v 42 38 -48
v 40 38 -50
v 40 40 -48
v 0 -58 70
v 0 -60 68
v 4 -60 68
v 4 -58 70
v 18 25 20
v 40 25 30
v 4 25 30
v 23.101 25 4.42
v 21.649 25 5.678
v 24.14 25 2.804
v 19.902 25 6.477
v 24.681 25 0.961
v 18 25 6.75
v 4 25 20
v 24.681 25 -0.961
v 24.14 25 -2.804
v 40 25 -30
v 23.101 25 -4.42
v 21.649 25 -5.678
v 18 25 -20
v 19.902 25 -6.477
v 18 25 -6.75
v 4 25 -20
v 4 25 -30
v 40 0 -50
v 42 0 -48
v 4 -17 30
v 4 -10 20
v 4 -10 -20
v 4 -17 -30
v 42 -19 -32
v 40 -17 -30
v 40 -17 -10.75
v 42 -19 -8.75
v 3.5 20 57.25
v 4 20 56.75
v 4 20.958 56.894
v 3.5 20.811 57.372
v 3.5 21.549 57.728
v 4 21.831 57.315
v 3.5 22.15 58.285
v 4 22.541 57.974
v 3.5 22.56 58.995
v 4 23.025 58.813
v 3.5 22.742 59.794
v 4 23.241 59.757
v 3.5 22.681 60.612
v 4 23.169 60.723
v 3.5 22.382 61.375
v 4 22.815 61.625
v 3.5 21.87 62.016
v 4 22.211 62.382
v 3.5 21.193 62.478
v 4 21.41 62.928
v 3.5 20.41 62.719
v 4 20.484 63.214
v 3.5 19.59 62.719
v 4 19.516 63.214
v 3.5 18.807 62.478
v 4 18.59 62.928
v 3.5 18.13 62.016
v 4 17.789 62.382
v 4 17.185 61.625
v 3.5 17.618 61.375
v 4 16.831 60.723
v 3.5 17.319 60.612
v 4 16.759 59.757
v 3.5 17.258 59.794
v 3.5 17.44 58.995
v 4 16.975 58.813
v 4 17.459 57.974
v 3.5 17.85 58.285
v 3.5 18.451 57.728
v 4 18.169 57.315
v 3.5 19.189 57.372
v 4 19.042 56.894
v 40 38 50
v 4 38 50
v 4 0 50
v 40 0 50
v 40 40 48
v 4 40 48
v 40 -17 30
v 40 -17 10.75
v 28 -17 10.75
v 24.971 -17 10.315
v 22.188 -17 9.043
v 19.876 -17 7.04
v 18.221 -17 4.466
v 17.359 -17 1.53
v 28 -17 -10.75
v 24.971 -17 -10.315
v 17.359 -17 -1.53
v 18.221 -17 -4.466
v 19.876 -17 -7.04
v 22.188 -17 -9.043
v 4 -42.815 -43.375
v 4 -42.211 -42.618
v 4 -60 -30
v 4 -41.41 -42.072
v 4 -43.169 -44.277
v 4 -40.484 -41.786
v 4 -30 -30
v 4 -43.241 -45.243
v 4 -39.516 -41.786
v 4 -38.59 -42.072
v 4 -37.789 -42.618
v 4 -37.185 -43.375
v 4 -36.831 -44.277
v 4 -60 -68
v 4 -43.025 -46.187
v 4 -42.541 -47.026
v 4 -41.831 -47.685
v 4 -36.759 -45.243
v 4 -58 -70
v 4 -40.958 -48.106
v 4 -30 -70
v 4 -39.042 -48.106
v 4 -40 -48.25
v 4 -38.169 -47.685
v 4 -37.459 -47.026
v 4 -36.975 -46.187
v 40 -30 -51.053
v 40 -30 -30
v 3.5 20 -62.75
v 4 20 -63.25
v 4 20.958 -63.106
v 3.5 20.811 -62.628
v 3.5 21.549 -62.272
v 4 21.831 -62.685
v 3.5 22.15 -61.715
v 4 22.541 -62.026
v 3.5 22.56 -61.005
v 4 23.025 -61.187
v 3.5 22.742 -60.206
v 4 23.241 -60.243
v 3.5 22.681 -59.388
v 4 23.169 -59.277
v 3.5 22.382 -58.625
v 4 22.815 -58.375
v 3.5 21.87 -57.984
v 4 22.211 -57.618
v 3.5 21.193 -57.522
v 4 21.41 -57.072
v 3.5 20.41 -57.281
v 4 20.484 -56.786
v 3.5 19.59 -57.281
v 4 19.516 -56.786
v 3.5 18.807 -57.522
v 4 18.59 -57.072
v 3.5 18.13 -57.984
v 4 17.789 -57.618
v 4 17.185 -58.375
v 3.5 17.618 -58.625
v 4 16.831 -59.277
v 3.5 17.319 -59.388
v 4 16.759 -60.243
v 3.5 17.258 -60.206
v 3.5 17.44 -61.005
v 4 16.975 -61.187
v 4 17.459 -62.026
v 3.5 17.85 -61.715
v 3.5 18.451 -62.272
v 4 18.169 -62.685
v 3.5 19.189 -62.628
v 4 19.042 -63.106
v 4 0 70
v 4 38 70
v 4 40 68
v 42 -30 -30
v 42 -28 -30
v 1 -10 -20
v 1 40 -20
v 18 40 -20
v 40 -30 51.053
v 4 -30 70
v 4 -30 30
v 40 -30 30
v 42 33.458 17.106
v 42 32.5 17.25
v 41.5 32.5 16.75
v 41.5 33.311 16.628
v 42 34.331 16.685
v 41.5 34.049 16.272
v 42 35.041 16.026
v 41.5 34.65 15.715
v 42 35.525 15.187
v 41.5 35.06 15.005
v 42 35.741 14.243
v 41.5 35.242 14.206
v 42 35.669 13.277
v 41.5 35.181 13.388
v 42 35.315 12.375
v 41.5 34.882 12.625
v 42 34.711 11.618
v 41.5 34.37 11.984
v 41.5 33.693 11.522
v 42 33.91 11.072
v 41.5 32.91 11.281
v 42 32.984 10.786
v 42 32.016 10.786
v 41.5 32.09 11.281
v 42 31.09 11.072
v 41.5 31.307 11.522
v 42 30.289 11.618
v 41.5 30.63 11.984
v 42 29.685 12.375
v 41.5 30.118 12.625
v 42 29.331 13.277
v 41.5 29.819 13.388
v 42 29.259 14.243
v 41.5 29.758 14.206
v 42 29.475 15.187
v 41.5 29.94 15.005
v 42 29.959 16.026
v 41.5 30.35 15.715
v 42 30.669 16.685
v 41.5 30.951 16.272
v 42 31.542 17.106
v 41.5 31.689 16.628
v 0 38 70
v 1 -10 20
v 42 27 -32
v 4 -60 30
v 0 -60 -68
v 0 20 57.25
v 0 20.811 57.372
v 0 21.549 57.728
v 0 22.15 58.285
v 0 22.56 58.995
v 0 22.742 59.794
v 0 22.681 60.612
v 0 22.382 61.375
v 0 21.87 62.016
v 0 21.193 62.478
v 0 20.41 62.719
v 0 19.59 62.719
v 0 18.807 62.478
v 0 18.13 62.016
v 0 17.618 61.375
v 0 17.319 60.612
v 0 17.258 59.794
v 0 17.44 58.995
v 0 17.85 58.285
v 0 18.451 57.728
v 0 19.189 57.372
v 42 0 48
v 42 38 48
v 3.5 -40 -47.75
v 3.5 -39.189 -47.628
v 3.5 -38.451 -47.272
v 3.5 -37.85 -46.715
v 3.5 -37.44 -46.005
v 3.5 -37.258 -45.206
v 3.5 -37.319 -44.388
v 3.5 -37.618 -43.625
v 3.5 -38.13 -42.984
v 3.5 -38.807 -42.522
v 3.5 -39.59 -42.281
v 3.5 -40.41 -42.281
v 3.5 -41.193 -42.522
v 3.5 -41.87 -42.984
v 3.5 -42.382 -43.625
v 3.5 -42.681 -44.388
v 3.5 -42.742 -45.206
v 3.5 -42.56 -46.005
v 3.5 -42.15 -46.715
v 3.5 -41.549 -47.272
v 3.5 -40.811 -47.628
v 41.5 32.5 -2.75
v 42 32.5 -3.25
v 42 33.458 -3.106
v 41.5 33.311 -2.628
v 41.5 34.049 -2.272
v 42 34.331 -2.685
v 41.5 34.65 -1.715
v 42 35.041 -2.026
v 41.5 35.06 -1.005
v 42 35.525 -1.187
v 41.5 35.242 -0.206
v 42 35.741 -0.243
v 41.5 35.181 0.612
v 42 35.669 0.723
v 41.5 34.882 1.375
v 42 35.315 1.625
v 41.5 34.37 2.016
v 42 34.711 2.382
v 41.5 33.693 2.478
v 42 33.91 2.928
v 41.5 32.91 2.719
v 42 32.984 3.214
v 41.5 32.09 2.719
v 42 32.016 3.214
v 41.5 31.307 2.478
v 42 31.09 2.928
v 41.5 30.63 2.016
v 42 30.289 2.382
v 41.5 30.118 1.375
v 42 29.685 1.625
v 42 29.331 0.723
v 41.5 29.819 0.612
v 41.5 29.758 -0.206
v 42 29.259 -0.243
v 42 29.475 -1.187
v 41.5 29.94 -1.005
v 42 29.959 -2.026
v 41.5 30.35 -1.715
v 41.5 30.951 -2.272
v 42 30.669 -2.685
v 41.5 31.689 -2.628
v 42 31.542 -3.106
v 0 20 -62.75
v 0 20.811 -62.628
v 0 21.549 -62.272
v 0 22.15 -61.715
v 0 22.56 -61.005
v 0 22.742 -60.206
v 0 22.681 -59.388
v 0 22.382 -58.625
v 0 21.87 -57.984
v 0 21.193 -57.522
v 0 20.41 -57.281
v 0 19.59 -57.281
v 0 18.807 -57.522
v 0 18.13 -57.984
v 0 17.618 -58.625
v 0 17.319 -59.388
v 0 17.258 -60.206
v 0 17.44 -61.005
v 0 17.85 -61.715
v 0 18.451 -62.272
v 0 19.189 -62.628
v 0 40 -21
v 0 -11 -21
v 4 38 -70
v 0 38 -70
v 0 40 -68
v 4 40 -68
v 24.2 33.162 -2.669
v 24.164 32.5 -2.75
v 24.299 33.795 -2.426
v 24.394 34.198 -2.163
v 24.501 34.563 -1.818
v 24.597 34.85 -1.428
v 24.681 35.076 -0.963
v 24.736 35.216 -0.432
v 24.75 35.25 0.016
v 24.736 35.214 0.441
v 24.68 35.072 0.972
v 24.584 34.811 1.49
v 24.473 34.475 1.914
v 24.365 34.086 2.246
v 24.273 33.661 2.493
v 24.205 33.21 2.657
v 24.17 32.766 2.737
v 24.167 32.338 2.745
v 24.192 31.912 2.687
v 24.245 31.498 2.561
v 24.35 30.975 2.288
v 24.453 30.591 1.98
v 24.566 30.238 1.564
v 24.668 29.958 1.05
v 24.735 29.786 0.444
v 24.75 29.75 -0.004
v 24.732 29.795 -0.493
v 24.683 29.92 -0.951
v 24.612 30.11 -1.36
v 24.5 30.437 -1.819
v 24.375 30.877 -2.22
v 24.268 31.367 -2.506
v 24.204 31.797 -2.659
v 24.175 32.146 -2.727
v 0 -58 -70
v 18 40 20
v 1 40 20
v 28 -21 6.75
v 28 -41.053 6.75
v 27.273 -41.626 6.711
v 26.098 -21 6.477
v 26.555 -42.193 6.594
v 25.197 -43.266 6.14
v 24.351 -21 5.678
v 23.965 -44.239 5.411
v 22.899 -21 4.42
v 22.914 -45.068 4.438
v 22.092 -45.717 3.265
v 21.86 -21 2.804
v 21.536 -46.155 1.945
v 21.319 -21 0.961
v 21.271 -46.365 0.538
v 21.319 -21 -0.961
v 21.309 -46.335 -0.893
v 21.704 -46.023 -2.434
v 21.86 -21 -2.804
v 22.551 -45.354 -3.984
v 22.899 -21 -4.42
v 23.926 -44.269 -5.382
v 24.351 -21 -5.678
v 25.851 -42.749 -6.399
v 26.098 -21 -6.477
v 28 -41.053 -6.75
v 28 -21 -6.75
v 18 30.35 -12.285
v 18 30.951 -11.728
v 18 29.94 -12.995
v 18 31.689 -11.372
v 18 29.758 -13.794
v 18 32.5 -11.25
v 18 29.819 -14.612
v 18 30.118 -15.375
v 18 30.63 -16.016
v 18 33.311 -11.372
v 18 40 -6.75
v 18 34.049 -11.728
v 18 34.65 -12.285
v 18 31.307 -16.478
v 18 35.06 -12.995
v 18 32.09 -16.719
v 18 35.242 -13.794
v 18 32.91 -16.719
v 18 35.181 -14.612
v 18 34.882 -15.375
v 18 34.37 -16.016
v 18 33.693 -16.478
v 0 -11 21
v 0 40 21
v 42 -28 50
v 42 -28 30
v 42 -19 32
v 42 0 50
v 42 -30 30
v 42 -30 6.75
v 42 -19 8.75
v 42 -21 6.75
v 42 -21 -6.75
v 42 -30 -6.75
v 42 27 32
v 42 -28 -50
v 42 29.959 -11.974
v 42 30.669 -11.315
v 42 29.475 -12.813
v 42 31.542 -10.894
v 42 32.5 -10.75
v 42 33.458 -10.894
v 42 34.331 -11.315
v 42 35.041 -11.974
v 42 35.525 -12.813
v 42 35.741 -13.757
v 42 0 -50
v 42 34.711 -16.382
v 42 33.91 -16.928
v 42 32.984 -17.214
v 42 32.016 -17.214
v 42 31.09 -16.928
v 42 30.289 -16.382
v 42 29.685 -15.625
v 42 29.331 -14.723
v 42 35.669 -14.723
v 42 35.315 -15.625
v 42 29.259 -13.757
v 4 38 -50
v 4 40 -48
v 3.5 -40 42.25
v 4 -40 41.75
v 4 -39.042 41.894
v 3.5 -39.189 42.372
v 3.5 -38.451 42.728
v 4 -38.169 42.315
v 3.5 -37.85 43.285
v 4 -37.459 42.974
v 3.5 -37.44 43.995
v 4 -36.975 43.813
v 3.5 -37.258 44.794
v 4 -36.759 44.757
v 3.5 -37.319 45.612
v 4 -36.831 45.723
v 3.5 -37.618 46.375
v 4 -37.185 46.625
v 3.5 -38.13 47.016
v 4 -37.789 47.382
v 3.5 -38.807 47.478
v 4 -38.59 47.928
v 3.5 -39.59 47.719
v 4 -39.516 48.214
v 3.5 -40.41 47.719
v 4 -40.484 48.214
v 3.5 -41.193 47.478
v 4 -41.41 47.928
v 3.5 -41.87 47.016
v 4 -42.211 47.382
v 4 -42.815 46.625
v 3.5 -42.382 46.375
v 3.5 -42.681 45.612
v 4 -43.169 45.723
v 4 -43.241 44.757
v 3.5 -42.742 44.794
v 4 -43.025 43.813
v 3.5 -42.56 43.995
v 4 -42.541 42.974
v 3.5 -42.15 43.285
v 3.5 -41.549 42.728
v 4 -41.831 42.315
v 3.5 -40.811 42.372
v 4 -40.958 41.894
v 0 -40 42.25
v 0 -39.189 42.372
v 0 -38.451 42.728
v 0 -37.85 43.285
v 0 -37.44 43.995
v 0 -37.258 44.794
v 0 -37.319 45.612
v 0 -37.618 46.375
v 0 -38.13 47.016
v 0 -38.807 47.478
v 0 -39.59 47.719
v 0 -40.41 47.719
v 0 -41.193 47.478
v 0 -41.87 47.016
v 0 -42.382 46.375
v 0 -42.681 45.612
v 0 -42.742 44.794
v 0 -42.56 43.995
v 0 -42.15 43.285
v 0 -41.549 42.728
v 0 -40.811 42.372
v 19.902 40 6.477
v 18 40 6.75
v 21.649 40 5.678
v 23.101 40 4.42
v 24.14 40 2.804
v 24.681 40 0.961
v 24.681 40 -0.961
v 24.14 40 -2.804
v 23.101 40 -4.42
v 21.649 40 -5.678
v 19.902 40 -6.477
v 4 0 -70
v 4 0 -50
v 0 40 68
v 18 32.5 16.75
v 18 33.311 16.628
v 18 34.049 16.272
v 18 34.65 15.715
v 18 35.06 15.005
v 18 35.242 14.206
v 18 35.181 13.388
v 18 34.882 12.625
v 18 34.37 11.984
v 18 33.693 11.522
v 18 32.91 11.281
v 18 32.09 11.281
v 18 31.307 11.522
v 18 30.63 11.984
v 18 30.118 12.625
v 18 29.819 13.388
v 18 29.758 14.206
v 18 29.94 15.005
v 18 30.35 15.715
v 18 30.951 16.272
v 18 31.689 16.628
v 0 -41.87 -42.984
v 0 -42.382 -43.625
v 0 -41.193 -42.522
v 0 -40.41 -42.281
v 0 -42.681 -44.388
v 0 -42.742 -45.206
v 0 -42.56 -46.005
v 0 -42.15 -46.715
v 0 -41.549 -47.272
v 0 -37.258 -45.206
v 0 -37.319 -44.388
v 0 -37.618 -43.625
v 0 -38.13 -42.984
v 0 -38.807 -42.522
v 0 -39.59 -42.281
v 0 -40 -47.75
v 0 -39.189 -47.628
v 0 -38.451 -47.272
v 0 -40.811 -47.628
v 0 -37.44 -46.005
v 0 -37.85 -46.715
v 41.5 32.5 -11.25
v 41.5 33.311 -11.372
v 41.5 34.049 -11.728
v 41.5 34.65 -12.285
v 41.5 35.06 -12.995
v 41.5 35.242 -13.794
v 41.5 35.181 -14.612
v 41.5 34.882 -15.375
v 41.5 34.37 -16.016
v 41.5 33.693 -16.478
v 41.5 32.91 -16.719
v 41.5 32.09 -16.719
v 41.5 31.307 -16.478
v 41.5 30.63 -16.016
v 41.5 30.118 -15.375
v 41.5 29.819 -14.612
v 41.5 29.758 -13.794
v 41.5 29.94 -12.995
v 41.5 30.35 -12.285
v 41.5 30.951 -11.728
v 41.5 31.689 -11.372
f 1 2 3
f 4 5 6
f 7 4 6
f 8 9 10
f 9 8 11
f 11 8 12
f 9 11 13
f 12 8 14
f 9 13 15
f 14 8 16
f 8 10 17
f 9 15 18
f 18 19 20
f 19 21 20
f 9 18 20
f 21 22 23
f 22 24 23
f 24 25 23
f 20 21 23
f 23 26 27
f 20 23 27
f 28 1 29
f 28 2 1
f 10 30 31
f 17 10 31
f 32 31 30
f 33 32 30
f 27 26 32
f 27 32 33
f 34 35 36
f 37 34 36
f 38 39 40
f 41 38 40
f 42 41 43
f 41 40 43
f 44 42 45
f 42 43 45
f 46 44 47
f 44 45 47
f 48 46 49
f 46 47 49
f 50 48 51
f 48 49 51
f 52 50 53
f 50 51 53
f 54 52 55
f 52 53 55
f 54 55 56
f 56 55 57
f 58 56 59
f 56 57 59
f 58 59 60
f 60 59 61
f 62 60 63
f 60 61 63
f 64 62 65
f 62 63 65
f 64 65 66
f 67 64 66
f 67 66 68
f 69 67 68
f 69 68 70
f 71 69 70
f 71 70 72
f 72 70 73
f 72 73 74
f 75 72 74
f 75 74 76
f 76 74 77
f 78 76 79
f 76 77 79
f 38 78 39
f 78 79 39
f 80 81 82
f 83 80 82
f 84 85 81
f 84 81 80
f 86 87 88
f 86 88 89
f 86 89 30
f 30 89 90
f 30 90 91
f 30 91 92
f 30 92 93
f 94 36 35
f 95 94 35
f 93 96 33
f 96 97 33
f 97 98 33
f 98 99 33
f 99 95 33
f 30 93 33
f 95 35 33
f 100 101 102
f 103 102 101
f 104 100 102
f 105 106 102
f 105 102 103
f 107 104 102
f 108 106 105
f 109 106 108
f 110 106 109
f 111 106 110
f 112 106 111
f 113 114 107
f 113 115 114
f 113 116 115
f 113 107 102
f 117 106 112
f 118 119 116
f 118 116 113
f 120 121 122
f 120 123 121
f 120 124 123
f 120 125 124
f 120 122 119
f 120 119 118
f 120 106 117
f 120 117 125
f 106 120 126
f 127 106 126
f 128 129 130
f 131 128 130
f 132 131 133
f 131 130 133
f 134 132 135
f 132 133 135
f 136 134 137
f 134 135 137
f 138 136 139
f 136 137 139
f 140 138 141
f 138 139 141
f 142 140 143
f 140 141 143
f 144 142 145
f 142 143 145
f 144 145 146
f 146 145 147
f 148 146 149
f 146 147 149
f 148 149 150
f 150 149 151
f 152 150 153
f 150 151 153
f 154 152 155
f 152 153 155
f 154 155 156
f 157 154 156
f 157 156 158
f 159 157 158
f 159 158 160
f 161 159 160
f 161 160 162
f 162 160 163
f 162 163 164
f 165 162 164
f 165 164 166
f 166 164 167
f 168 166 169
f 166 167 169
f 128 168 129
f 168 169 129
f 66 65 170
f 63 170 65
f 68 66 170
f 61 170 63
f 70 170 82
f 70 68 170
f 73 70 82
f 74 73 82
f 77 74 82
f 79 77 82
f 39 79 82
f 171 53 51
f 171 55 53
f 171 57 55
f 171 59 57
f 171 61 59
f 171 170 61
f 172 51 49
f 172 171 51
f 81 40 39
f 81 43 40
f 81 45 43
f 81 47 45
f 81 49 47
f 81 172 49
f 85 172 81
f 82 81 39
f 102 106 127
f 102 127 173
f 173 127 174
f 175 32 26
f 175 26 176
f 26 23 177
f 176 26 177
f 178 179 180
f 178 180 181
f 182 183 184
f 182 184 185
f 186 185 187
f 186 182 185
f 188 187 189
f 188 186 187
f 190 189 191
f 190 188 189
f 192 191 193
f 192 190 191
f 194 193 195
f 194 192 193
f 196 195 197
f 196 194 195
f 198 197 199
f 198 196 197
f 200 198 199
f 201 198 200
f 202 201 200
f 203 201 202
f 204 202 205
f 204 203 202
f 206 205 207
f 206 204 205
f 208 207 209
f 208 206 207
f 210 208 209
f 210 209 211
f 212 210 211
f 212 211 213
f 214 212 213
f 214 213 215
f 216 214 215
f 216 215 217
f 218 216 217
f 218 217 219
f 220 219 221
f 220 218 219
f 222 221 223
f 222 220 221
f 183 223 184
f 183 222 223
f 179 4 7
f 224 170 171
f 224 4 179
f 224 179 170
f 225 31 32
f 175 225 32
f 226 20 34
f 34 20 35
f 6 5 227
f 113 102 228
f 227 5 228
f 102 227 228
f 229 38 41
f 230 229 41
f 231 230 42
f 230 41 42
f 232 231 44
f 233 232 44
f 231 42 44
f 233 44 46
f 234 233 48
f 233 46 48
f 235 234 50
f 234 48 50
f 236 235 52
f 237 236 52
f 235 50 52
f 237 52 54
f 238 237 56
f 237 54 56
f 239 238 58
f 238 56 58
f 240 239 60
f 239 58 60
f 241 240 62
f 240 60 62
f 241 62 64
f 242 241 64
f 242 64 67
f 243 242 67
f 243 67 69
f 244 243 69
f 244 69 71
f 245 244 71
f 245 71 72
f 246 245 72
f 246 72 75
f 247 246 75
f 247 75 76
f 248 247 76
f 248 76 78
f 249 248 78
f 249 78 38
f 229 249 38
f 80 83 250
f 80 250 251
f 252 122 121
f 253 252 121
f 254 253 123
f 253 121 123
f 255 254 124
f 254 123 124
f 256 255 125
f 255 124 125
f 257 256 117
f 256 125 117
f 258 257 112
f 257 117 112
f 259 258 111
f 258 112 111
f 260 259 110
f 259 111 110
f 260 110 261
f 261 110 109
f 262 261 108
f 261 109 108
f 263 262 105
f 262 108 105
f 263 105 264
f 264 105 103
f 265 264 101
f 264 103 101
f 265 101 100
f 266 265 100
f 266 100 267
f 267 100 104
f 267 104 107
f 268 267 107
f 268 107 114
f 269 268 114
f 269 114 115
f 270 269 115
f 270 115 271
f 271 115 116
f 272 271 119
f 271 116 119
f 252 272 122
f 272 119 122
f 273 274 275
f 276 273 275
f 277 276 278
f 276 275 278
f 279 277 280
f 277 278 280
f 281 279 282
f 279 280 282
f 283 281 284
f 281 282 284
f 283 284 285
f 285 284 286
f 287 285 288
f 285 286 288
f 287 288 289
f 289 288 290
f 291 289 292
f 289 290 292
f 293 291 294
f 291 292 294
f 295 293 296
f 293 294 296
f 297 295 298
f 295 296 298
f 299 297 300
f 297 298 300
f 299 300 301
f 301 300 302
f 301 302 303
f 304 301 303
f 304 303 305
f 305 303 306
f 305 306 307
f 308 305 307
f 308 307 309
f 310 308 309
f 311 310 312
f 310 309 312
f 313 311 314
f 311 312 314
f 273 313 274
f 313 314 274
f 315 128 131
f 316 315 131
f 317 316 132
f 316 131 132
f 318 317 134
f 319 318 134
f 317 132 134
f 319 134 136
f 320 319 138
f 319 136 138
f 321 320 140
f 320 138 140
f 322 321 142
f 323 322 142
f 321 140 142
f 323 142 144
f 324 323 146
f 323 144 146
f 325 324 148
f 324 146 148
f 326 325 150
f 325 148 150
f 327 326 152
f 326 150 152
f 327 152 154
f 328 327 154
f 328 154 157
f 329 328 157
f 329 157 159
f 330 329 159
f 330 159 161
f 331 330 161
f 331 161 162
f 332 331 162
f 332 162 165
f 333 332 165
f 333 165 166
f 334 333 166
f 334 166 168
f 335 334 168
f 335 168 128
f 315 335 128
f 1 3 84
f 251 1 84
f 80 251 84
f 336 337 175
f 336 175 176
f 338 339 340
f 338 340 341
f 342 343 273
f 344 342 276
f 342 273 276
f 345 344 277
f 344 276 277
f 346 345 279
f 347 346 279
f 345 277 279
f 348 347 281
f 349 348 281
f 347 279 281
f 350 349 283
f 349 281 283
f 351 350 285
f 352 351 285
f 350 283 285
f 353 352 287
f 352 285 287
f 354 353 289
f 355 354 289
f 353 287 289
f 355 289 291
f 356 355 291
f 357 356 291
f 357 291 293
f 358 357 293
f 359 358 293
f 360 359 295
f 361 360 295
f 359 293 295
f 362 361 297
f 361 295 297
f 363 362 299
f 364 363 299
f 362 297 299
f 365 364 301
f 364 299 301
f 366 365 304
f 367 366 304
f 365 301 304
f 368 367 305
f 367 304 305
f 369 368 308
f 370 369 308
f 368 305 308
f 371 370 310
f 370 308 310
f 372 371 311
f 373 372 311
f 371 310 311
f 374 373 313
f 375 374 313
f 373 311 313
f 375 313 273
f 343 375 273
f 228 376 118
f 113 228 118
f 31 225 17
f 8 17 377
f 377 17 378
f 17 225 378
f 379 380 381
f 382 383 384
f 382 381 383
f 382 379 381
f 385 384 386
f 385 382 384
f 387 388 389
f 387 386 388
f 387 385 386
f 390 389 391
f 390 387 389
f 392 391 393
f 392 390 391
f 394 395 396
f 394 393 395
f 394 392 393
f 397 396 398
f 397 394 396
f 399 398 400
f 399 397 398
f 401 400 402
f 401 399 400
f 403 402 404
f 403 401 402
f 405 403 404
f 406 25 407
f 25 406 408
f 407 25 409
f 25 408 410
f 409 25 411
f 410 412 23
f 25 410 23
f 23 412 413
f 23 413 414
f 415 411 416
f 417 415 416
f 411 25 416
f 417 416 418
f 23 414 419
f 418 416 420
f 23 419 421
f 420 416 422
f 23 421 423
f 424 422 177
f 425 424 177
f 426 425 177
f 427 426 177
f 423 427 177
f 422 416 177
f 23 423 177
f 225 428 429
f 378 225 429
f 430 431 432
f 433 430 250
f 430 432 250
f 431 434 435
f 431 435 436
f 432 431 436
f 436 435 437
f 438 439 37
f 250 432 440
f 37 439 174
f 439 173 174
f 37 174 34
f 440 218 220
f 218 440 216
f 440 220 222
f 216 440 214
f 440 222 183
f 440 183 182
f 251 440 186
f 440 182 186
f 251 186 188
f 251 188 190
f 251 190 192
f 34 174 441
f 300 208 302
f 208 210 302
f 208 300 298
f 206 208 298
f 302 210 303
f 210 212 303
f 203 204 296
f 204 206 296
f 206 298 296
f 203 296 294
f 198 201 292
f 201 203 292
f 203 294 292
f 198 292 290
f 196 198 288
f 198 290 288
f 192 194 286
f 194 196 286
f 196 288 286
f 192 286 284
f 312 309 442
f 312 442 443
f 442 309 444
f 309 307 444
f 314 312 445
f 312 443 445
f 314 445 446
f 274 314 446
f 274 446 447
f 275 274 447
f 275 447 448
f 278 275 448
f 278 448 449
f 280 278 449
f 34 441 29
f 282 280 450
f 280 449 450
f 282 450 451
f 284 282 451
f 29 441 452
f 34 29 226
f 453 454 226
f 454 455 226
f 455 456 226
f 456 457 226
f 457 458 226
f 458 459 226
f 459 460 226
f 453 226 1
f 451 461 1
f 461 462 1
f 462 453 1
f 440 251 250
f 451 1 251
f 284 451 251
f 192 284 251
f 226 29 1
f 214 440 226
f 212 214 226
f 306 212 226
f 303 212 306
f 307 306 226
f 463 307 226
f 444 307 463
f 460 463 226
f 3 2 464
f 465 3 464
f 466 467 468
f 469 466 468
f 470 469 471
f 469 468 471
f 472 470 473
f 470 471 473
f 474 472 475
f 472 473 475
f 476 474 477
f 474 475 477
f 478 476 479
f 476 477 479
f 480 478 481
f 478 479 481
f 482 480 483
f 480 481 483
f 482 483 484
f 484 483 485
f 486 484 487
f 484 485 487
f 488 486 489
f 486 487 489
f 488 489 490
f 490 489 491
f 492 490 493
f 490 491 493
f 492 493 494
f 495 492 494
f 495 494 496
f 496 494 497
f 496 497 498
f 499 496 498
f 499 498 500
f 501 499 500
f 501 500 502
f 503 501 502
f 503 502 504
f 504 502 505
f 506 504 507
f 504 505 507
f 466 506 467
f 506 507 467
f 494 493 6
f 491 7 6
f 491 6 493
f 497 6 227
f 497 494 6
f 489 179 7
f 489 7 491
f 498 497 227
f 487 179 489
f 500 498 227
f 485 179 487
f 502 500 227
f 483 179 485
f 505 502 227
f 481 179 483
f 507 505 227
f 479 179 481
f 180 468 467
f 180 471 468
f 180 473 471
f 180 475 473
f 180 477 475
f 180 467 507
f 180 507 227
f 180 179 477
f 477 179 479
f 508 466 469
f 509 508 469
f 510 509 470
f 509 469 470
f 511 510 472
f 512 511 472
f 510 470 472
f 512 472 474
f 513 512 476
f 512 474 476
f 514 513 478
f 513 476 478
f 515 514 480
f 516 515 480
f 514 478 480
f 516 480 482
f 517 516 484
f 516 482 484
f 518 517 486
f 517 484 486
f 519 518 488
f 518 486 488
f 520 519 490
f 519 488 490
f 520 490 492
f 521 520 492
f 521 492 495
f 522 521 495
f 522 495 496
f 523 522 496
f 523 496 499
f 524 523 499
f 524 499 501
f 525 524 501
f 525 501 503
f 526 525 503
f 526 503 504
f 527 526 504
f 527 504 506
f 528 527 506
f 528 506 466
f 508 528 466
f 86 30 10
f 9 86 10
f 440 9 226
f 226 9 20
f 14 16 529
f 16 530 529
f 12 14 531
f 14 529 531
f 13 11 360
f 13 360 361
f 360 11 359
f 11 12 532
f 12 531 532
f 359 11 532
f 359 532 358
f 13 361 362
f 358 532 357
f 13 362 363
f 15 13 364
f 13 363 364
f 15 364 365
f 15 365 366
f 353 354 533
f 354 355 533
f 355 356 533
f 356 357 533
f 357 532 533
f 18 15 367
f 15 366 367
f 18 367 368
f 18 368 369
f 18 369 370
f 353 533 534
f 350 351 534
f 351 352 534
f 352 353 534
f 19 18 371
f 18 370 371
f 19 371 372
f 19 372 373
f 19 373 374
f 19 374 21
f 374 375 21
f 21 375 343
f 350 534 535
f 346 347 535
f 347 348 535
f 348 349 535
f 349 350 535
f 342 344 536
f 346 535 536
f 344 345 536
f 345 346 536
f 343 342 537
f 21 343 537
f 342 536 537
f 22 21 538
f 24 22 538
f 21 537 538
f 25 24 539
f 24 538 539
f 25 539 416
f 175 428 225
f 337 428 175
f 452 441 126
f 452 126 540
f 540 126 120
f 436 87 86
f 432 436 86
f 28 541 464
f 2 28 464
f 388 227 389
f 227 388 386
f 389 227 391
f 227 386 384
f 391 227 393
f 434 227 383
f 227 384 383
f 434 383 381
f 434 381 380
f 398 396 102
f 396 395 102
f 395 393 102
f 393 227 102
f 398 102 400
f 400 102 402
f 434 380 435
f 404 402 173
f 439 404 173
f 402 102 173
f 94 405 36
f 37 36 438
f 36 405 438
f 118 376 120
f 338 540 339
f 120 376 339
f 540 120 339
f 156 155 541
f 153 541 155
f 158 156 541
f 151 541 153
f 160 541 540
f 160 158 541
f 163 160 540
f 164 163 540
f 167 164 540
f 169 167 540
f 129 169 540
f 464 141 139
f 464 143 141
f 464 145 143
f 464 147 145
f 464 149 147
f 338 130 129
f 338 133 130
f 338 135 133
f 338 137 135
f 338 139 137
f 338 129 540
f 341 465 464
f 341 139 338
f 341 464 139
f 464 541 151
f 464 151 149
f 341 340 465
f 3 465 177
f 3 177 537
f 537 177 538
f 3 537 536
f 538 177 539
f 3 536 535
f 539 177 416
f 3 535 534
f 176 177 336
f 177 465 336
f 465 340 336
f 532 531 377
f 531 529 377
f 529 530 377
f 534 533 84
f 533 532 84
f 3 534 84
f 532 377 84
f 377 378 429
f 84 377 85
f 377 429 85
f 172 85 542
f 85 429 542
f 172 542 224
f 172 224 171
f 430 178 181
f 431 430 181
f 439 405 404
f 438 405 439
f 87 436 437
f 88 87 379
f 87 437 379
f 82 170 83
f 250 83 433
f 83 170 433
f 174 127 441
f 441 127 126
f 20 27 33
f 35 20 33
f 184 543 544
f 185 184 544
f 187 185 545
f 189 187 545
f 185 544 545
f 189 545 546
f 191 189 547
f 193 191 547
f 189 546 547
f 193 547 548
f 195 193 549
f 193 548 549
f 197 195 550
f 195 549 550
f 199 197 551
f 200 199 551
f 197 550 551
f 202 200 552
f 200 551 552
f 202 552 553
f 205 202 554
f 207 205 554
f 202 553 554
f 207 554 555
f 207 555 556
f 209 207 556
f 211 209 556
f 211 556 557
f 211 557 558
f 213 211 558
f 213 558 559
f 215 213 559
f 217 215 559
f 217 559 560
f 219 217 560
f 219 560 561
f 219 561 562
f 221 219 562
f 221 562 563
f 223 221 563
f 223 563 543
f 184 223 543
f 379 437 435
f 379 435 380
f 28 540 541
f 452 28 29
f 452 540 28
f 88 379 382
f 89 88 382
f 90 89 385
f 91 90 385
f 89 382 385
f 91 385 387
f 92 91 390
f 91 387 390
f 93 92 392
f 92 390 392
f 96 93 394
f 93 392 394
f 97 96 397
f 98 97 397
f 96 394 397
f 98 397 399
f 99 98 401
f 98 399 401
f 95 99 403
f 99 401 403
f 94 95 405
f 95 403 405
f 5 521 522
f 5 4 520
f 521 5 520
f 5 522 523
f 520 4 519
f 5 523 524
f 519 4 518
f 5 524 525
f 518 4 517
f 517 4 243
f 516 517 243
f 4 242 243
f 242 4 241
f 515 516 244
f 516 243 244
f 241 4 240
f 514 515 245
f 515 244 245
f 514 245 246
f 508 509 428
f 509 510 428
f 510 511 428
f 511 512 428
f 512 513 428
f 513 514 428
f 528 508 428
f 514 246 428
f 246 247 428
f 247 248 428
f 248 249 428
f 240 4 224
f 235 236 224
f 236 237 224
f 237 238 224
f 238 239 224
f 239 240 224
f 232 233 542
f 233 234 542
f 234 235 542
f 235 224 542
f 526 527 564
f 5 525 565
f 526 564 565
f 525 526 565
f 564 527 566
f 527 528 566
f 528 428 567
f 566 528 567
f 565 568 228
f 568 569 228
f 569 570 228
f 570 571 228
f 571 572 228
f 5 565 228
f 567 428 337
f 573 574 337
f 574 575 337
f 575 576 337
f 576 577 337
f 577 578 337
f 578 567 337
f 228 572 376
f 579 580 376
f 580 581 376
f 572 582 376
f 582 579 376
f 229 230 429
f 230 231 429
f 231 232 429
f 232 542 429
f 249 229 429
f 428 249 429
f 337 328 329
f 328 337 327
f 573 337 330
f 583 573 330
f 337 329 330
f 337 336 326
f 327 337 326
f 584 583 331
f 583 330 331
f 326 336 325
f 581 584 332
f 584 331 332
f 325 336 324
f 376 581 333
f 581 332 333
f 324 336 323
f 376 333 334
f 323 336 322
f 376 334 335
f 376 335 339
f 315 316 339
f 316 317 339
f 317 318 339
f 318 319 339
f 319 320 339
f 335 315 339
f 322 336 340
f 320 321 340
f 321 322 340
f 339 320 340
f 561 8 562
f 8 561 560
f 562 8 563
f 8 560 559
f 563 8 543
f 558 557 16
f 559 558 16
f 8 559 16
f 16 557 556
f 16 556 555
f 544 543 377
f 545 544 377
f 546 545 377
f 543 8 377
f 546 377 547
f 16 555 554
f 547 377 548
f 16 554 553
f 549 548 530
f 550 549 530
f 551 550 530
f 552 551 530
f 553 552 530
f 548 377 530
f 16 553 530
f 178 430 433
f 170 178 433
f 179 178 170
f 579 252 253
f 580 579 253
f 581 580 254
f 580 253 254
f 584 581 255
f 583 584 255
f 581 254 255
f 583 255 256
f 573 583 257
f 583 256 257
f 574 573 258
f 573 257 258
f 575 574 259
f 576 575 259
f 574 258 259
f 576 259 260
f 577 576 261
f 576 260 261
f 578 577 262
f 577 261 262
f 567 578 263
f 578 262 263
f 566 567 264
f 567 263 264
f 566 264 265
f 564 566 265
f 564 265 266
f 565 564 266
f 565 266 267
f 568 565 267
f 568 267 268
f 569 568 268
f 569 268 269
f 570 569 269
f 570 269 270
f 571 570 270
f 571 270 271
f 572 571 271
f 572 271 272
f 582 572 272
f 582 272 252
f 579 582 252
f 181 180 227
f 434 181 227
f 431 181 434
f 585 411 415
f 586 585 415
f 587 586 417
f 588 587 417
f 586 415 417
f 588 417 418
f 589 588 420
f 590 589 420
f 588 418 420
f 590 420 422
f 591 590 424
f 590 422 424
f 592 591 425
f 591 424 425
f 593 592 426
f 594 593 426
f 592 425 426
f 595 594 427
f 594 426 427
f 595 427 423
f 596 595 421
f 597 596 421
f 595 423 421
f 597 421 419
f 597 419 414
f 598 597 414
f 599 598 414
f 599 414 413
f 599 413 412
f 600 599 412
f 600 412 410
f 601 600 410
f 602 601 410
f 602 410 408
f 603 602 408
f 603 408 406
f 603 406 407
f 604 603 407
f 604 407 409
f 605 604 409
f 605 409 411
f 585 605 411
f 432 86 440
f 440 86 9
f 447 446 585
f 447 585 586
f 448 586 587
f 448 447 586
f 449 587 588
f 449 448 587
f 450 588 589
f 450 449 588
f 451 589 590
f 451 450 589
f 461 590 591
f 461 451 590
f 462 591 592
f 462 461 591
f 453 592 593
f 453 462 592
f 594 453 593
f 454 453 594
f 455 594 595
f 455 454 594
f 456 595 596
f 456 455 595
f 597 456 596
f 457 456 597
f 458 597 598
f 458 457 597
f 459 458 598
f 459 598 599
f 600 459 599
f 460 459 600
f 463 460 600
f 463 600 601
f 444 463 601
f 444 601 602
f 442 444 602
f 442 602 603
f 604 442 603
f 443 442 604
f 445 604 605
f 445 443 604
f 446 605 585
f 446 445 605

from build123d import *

# Parameters (mm, degrees)
SKETCH_1_W          = 140
SKETCH_1_H          = 100
EXTRUDE_1_DEPTH     = 4
SKETCH_9_R          = 2.75
CUT_EXTRUDE_3_DEPTH = 8
CHAMFER_2_SIZE      = 2
SKETCH_11_W         = 40
SKETCH_11_H         = 50
CUT_EXTRUDE_5_DEPTH = 5
SKETCH_12_W         = 10
SKETCH_12_H         = 15
EXTRUDE_2_DEPTH     = 14
SKETCH_13_W         = 60
SKETCH_13_H         = 15
EXTRUDE_3_DEPTH     = 14
SKETCH_14_W         = 28
SKETCH_14_H         = 70
EXTRUDE_4_DEPTH     = 20
SKETCH_15_W         = 28
SKETCH_15_H         = 70
EXTRUDE_5_DEPTH     = 20
SKETCH_16_R         = 6.75
CUT_EXTRUDE_6_DEPTH = 20
EXTRUDE_6_DEPTH     = 10
SKETCH_18_R         = 2.75
CUT_EXTRUDE_7_DEPTH = 96.268042911
SKETCH_19_R         = 2.75
CUT_EXTRUDE_8_DEPTH = 100
CHAMFER_3_SIZE      = 0.5
EXTRUDE_7_DEPTH     = 20
EXTRUDE_8_DEPTH     = 20
EXTRUDE_9_DEPTH     = 60
EXTRUDE_10_DEPTH    = 30
CHAMFER_4_SIZE      = 0.5
CHAMFER_5_SIZE      = 2
CHAMFER_6_SIZE      = 2
CHAMFER_7_SIZE      = 1
CUT_EXTRUDE_9_DEPTH = 100.564049794
CHAMFER_8_SIZE      = 4


with BuildPart() as part:
    # 草图1 → 凸台-拉伸1 (new body)
    with BuildSketch(Plane(origin=(0, 0, 0), x_dir=(0, 0, -1), z_dir=(1, 0, 0))):
        with Locations((0, -10)):
            Rectangle(SKETCH_1_W, SKETCH_1_H)
    extrude(amount=EXTRUDE_1_DEPTH)

    # 草图9 → 切除-拉伸3 (cut)
    with BuildSketch(Plane(origin=(4, 0, 0), x_dir=(0, 0, -1), z_dir=(1, 0, 0))):
        with Locations((-60, 20)):
            Circle(SKETCH_9_R)
        with Locations((60, 20)):
            Circle(SKETCH_9_R)
        with Locations((-45, -40)):
            Circle(SKETCH_9_R)
        with Locations((45, -40)):
            Circle(SKETCH_9_R)
    extrude(amount=-CUT_EXTRUDE_3_DEPTH, mode=Mode.SUBTRACT)

    # 倒角2
    chamfer_2_edges = [part.edges().sort_by_distance(p)[0] for p in [
        (2, 40, 70),
        (2, 40, -70),
        (2, -60, -70),
        (2, -60, 70),
    ]]
    chamfer(chamfer_2_edges, length=CHAMFER_2_SIZE)

    # 草图11 → 切除-拉伸5 (cut)
    with BuildSketch(Plane(origin=(4, 0, 0), x_dir=(0, 0, -1), z_dir=(1, 0, 0))):
        with Locations((0, 15)):
            Rectangle(SKETCH_11_W, SKETCH_11_H)
    extrude(amount=-CUT_EXTRUDE_5_DEPTH, mode=Mode.SUBTRACT)

    # 草图12 → 凸台-拉伸2 (add)
    with BuildSketch(Plane(origin=(4, 0, 0), x_dir=(0, 0, -1), z_dir=(1, 0, 0))):
        with Locations((-25, 32.5)):
            Rectangle(SKETCH_12_W, SKETCH_12_H)
        with Locations((25, 32.5)):
            Rectangle(SKETCH_12_W, SKETCH_12_H)
    extrude(amount=EXTRUDE_2_DEPTH)

    # 草图13 → 凸台-拉伸3 (add)
    with BuildSketch(Plane(origin=(18, 0, 0), x_dir=(0, 0, -1), z_dir=(1, 0, 0))):
        with Locations((0, 32.5)):
            Rectangle(SKETCH_13_W, SKETCH_13_H)
    extrude(amount=EXTRUDE_3_DEPTH)

    # 草图14 → 凸台-拉伸4 (add)
    with BuildSketch(Plane.XY.offset(30)):
        with Locations((18, 5)):
            Rectangle(SKETCH_14_W, SKETCH_14_H)
    extrude(amount=EXTRUDE_4_DEPTH)

    # 草图15 → 凸台-拉伸5 (add)
    with BuildSketch(Plane(origin=(0, 0, -30), x_dir=(-1, 0, 0), z_dir=(0, 0, -1))):
        with Locations((-18, 5)):
            Rectangle(SKETCH_15_W, SKETCH_15_H)
    extrude(amount=EXTRUDE_5_DEPTH)

    # 草图16 → 切除-拉伸6 (cut)
    with BuildSketch(Plane(origin=(0, 40, 0), x_dir=(1, 0, 0), z_dir=(0, 1, 0))):
        with Locations((18, 0)):
            Circle(SKETCH_16_R)
    extrude(amount=-CUT_EXTRUDE_6_DEPTH, mode=Mode.SUBTRACT)

    # 草图17 → 凸台-拉伸6 (add)
    with BuildSketch(Plane(origin=(32, 0, 0), x_dir=(0, 0, -1), z_dir=(1, 0, 0))):
        Polygon((50, 40), (-50, 40), (-50, -30), (-30, -30), (-30, 25), (30, 25), (30, -30), (50, -30), align=None)
    extrude(amount=EXTRUDE_6_DEPTH)

    # 草图18 → 切除-拉伸7 (cut, through all)
    with BuildSketch(Plane.ZY.offset(-18)):
        with Locations((14, 32.5)):
            Circle(SKETCH_18_R)
        with Locations((-14, 32.5)):
            Circle(SKETCH_18_R)
    extrude(amount=-CUT_EXTRUDE_7_DEPTH, mode=Mode.SUBTRACT)

    # 草图19 → 切除-拉伸8 (cut)
    with BuildSketch(Plane(origin=(42, 0, 0), x_dir=(0, 0, -1), z_dir=(1, 0, 0))):
        with Locations((0, 32.5)):
            Circle(SKETCH_19_R)
    extrude(amount=-CUT_EXTRUDE_8_DEPTH, mode=Mode.SUBTRACT)

    # 倒角3
    chamfer_3_edges = [part.edges().sort_by_distance(p)[0] for p in [
        (4, 20, 62.75),
        (4, -40, -42.25),
        (4, -40, 47.75),
        (4, 20, -57.25),
    ]]
    chamfer(chamfer_3_edges, length=CHAMFER_3_SIZE)

    # 草图20 → 凸台-拉伸7 (add)
    with BuildSketch(Plane.XY.offset(50)):
        Polygon((42, 25), (4, -30), (32, 25), align=None)
    extrude(amount=-EXTRUDE_7_DEPTH)

    # 草图21 → 凸台-拉伸8 (add)
    with BuildSketch(Plane(origin=(0, 0, -50), x_dir=(-1, 0, 0), z_dir=(0, 0, -1))):
        Polygon((-42, 25), (-4, -30), (-32, 25), align=None)
    extrude(amount=-EXTRUDE_8_DEPTH)

    # 草图22 → 凸台-拉伸9 (add)
    with BuildSketch(Plane.XY.offset(-30)):
        Polygon((42, -17), (4, -17), (4, -60), (42, -30), align=None)
    extrude(amount=EXTRUDE_9_DEPTH)

    # 草图23 → 凸台-拉伸10 (add)
    with BuildSketch(Plane.XZ.offset(30)):
        Polygon((42, 50), (4, 70), (4, 50), align=None)
    extrude_10 = extrude(amount=-EXTRUDE_10_DEPTH)

    # 镜向1: 凸台-拉伸10 across plane
    add(extrude_10.mirror(Plane.XY))

    # 倒角4
    chamfer_4_edges = [part.edges().sort_by_distance(p)[0] for p in [
        (42, 32.5, 11.25),
        (42, 32.5, -16.75),
        (42, 32.5, 2.75),
    ]]
    chamfer(chamfer_4_edges, length=CHAMFER_4_SIZE)

    # 倒角5
    chamfer_5_edges = [part.edges().sort_by_distance(p)[0] for p in [
        (42, 25, 0),
        (42, 4, -30),
        (42, 4, 30),
        (42, -17, 0),
    ]]
    chamfer(chamfer_5_edges, length=CHAMFER_5_SIZE)

    # 倒角6
    chamfer_6_edges = [part.edges().sort_by_distance(p)[0] for p in [
        (42, -30, 40),
        (42, -30, -40),
        (42, 20, 50),
        (42, 20, -50),
        (23, 40, -50),
        (42, 40, 0),
        (23, 40, 50),
    ]]
    chamfer(chamfer_6_edges, length=CHAMFER_6_SIZE)

    # 倒角7
    chamfer_7_edges = [part.edges().sort_by_distance(p)[0] for p in [
        (0, -10, 0),
        (0, 15, -20),
        (0, 15, 20),
    ]]
    chamfer(chamfer_7_edges, length=CHAMFER_7_SIZE)

    # 草图24 → 切除-拉伸9 (cut, through all)
    with BuildSketch(Plane(origin=(0, -17, 0), x_dir=(1, 0, 0), z_dir=(0, 1, 0))):
        with BuildLine():
            Line((28, 6.75), (43.669106449, 6.75))
            Line((43.669106449, 6.75), (43.669106449, -6.75))
            Line((43.669106449, -6.75), (28, -6.75))
            ThreePointArc((28, -6.75), (21.25, 0), (28, 6.75))
        make_face()
    extrude(amount=-CUT_EXTRUDE_9_DEPTH, mode=Mode.SUBTRACT)

    # 倒角8
    chamfer_8_edges = [part.edges().sort_by_distance(p)[0] for p in [
        (34, -17, -6.75),
        (34, -17, 6.75),
        (21.25, -17, 0),
    ]]
    chamfer(chamfer_8_edges, length=CHAMFER_8_SIZE)


solid = part.part
